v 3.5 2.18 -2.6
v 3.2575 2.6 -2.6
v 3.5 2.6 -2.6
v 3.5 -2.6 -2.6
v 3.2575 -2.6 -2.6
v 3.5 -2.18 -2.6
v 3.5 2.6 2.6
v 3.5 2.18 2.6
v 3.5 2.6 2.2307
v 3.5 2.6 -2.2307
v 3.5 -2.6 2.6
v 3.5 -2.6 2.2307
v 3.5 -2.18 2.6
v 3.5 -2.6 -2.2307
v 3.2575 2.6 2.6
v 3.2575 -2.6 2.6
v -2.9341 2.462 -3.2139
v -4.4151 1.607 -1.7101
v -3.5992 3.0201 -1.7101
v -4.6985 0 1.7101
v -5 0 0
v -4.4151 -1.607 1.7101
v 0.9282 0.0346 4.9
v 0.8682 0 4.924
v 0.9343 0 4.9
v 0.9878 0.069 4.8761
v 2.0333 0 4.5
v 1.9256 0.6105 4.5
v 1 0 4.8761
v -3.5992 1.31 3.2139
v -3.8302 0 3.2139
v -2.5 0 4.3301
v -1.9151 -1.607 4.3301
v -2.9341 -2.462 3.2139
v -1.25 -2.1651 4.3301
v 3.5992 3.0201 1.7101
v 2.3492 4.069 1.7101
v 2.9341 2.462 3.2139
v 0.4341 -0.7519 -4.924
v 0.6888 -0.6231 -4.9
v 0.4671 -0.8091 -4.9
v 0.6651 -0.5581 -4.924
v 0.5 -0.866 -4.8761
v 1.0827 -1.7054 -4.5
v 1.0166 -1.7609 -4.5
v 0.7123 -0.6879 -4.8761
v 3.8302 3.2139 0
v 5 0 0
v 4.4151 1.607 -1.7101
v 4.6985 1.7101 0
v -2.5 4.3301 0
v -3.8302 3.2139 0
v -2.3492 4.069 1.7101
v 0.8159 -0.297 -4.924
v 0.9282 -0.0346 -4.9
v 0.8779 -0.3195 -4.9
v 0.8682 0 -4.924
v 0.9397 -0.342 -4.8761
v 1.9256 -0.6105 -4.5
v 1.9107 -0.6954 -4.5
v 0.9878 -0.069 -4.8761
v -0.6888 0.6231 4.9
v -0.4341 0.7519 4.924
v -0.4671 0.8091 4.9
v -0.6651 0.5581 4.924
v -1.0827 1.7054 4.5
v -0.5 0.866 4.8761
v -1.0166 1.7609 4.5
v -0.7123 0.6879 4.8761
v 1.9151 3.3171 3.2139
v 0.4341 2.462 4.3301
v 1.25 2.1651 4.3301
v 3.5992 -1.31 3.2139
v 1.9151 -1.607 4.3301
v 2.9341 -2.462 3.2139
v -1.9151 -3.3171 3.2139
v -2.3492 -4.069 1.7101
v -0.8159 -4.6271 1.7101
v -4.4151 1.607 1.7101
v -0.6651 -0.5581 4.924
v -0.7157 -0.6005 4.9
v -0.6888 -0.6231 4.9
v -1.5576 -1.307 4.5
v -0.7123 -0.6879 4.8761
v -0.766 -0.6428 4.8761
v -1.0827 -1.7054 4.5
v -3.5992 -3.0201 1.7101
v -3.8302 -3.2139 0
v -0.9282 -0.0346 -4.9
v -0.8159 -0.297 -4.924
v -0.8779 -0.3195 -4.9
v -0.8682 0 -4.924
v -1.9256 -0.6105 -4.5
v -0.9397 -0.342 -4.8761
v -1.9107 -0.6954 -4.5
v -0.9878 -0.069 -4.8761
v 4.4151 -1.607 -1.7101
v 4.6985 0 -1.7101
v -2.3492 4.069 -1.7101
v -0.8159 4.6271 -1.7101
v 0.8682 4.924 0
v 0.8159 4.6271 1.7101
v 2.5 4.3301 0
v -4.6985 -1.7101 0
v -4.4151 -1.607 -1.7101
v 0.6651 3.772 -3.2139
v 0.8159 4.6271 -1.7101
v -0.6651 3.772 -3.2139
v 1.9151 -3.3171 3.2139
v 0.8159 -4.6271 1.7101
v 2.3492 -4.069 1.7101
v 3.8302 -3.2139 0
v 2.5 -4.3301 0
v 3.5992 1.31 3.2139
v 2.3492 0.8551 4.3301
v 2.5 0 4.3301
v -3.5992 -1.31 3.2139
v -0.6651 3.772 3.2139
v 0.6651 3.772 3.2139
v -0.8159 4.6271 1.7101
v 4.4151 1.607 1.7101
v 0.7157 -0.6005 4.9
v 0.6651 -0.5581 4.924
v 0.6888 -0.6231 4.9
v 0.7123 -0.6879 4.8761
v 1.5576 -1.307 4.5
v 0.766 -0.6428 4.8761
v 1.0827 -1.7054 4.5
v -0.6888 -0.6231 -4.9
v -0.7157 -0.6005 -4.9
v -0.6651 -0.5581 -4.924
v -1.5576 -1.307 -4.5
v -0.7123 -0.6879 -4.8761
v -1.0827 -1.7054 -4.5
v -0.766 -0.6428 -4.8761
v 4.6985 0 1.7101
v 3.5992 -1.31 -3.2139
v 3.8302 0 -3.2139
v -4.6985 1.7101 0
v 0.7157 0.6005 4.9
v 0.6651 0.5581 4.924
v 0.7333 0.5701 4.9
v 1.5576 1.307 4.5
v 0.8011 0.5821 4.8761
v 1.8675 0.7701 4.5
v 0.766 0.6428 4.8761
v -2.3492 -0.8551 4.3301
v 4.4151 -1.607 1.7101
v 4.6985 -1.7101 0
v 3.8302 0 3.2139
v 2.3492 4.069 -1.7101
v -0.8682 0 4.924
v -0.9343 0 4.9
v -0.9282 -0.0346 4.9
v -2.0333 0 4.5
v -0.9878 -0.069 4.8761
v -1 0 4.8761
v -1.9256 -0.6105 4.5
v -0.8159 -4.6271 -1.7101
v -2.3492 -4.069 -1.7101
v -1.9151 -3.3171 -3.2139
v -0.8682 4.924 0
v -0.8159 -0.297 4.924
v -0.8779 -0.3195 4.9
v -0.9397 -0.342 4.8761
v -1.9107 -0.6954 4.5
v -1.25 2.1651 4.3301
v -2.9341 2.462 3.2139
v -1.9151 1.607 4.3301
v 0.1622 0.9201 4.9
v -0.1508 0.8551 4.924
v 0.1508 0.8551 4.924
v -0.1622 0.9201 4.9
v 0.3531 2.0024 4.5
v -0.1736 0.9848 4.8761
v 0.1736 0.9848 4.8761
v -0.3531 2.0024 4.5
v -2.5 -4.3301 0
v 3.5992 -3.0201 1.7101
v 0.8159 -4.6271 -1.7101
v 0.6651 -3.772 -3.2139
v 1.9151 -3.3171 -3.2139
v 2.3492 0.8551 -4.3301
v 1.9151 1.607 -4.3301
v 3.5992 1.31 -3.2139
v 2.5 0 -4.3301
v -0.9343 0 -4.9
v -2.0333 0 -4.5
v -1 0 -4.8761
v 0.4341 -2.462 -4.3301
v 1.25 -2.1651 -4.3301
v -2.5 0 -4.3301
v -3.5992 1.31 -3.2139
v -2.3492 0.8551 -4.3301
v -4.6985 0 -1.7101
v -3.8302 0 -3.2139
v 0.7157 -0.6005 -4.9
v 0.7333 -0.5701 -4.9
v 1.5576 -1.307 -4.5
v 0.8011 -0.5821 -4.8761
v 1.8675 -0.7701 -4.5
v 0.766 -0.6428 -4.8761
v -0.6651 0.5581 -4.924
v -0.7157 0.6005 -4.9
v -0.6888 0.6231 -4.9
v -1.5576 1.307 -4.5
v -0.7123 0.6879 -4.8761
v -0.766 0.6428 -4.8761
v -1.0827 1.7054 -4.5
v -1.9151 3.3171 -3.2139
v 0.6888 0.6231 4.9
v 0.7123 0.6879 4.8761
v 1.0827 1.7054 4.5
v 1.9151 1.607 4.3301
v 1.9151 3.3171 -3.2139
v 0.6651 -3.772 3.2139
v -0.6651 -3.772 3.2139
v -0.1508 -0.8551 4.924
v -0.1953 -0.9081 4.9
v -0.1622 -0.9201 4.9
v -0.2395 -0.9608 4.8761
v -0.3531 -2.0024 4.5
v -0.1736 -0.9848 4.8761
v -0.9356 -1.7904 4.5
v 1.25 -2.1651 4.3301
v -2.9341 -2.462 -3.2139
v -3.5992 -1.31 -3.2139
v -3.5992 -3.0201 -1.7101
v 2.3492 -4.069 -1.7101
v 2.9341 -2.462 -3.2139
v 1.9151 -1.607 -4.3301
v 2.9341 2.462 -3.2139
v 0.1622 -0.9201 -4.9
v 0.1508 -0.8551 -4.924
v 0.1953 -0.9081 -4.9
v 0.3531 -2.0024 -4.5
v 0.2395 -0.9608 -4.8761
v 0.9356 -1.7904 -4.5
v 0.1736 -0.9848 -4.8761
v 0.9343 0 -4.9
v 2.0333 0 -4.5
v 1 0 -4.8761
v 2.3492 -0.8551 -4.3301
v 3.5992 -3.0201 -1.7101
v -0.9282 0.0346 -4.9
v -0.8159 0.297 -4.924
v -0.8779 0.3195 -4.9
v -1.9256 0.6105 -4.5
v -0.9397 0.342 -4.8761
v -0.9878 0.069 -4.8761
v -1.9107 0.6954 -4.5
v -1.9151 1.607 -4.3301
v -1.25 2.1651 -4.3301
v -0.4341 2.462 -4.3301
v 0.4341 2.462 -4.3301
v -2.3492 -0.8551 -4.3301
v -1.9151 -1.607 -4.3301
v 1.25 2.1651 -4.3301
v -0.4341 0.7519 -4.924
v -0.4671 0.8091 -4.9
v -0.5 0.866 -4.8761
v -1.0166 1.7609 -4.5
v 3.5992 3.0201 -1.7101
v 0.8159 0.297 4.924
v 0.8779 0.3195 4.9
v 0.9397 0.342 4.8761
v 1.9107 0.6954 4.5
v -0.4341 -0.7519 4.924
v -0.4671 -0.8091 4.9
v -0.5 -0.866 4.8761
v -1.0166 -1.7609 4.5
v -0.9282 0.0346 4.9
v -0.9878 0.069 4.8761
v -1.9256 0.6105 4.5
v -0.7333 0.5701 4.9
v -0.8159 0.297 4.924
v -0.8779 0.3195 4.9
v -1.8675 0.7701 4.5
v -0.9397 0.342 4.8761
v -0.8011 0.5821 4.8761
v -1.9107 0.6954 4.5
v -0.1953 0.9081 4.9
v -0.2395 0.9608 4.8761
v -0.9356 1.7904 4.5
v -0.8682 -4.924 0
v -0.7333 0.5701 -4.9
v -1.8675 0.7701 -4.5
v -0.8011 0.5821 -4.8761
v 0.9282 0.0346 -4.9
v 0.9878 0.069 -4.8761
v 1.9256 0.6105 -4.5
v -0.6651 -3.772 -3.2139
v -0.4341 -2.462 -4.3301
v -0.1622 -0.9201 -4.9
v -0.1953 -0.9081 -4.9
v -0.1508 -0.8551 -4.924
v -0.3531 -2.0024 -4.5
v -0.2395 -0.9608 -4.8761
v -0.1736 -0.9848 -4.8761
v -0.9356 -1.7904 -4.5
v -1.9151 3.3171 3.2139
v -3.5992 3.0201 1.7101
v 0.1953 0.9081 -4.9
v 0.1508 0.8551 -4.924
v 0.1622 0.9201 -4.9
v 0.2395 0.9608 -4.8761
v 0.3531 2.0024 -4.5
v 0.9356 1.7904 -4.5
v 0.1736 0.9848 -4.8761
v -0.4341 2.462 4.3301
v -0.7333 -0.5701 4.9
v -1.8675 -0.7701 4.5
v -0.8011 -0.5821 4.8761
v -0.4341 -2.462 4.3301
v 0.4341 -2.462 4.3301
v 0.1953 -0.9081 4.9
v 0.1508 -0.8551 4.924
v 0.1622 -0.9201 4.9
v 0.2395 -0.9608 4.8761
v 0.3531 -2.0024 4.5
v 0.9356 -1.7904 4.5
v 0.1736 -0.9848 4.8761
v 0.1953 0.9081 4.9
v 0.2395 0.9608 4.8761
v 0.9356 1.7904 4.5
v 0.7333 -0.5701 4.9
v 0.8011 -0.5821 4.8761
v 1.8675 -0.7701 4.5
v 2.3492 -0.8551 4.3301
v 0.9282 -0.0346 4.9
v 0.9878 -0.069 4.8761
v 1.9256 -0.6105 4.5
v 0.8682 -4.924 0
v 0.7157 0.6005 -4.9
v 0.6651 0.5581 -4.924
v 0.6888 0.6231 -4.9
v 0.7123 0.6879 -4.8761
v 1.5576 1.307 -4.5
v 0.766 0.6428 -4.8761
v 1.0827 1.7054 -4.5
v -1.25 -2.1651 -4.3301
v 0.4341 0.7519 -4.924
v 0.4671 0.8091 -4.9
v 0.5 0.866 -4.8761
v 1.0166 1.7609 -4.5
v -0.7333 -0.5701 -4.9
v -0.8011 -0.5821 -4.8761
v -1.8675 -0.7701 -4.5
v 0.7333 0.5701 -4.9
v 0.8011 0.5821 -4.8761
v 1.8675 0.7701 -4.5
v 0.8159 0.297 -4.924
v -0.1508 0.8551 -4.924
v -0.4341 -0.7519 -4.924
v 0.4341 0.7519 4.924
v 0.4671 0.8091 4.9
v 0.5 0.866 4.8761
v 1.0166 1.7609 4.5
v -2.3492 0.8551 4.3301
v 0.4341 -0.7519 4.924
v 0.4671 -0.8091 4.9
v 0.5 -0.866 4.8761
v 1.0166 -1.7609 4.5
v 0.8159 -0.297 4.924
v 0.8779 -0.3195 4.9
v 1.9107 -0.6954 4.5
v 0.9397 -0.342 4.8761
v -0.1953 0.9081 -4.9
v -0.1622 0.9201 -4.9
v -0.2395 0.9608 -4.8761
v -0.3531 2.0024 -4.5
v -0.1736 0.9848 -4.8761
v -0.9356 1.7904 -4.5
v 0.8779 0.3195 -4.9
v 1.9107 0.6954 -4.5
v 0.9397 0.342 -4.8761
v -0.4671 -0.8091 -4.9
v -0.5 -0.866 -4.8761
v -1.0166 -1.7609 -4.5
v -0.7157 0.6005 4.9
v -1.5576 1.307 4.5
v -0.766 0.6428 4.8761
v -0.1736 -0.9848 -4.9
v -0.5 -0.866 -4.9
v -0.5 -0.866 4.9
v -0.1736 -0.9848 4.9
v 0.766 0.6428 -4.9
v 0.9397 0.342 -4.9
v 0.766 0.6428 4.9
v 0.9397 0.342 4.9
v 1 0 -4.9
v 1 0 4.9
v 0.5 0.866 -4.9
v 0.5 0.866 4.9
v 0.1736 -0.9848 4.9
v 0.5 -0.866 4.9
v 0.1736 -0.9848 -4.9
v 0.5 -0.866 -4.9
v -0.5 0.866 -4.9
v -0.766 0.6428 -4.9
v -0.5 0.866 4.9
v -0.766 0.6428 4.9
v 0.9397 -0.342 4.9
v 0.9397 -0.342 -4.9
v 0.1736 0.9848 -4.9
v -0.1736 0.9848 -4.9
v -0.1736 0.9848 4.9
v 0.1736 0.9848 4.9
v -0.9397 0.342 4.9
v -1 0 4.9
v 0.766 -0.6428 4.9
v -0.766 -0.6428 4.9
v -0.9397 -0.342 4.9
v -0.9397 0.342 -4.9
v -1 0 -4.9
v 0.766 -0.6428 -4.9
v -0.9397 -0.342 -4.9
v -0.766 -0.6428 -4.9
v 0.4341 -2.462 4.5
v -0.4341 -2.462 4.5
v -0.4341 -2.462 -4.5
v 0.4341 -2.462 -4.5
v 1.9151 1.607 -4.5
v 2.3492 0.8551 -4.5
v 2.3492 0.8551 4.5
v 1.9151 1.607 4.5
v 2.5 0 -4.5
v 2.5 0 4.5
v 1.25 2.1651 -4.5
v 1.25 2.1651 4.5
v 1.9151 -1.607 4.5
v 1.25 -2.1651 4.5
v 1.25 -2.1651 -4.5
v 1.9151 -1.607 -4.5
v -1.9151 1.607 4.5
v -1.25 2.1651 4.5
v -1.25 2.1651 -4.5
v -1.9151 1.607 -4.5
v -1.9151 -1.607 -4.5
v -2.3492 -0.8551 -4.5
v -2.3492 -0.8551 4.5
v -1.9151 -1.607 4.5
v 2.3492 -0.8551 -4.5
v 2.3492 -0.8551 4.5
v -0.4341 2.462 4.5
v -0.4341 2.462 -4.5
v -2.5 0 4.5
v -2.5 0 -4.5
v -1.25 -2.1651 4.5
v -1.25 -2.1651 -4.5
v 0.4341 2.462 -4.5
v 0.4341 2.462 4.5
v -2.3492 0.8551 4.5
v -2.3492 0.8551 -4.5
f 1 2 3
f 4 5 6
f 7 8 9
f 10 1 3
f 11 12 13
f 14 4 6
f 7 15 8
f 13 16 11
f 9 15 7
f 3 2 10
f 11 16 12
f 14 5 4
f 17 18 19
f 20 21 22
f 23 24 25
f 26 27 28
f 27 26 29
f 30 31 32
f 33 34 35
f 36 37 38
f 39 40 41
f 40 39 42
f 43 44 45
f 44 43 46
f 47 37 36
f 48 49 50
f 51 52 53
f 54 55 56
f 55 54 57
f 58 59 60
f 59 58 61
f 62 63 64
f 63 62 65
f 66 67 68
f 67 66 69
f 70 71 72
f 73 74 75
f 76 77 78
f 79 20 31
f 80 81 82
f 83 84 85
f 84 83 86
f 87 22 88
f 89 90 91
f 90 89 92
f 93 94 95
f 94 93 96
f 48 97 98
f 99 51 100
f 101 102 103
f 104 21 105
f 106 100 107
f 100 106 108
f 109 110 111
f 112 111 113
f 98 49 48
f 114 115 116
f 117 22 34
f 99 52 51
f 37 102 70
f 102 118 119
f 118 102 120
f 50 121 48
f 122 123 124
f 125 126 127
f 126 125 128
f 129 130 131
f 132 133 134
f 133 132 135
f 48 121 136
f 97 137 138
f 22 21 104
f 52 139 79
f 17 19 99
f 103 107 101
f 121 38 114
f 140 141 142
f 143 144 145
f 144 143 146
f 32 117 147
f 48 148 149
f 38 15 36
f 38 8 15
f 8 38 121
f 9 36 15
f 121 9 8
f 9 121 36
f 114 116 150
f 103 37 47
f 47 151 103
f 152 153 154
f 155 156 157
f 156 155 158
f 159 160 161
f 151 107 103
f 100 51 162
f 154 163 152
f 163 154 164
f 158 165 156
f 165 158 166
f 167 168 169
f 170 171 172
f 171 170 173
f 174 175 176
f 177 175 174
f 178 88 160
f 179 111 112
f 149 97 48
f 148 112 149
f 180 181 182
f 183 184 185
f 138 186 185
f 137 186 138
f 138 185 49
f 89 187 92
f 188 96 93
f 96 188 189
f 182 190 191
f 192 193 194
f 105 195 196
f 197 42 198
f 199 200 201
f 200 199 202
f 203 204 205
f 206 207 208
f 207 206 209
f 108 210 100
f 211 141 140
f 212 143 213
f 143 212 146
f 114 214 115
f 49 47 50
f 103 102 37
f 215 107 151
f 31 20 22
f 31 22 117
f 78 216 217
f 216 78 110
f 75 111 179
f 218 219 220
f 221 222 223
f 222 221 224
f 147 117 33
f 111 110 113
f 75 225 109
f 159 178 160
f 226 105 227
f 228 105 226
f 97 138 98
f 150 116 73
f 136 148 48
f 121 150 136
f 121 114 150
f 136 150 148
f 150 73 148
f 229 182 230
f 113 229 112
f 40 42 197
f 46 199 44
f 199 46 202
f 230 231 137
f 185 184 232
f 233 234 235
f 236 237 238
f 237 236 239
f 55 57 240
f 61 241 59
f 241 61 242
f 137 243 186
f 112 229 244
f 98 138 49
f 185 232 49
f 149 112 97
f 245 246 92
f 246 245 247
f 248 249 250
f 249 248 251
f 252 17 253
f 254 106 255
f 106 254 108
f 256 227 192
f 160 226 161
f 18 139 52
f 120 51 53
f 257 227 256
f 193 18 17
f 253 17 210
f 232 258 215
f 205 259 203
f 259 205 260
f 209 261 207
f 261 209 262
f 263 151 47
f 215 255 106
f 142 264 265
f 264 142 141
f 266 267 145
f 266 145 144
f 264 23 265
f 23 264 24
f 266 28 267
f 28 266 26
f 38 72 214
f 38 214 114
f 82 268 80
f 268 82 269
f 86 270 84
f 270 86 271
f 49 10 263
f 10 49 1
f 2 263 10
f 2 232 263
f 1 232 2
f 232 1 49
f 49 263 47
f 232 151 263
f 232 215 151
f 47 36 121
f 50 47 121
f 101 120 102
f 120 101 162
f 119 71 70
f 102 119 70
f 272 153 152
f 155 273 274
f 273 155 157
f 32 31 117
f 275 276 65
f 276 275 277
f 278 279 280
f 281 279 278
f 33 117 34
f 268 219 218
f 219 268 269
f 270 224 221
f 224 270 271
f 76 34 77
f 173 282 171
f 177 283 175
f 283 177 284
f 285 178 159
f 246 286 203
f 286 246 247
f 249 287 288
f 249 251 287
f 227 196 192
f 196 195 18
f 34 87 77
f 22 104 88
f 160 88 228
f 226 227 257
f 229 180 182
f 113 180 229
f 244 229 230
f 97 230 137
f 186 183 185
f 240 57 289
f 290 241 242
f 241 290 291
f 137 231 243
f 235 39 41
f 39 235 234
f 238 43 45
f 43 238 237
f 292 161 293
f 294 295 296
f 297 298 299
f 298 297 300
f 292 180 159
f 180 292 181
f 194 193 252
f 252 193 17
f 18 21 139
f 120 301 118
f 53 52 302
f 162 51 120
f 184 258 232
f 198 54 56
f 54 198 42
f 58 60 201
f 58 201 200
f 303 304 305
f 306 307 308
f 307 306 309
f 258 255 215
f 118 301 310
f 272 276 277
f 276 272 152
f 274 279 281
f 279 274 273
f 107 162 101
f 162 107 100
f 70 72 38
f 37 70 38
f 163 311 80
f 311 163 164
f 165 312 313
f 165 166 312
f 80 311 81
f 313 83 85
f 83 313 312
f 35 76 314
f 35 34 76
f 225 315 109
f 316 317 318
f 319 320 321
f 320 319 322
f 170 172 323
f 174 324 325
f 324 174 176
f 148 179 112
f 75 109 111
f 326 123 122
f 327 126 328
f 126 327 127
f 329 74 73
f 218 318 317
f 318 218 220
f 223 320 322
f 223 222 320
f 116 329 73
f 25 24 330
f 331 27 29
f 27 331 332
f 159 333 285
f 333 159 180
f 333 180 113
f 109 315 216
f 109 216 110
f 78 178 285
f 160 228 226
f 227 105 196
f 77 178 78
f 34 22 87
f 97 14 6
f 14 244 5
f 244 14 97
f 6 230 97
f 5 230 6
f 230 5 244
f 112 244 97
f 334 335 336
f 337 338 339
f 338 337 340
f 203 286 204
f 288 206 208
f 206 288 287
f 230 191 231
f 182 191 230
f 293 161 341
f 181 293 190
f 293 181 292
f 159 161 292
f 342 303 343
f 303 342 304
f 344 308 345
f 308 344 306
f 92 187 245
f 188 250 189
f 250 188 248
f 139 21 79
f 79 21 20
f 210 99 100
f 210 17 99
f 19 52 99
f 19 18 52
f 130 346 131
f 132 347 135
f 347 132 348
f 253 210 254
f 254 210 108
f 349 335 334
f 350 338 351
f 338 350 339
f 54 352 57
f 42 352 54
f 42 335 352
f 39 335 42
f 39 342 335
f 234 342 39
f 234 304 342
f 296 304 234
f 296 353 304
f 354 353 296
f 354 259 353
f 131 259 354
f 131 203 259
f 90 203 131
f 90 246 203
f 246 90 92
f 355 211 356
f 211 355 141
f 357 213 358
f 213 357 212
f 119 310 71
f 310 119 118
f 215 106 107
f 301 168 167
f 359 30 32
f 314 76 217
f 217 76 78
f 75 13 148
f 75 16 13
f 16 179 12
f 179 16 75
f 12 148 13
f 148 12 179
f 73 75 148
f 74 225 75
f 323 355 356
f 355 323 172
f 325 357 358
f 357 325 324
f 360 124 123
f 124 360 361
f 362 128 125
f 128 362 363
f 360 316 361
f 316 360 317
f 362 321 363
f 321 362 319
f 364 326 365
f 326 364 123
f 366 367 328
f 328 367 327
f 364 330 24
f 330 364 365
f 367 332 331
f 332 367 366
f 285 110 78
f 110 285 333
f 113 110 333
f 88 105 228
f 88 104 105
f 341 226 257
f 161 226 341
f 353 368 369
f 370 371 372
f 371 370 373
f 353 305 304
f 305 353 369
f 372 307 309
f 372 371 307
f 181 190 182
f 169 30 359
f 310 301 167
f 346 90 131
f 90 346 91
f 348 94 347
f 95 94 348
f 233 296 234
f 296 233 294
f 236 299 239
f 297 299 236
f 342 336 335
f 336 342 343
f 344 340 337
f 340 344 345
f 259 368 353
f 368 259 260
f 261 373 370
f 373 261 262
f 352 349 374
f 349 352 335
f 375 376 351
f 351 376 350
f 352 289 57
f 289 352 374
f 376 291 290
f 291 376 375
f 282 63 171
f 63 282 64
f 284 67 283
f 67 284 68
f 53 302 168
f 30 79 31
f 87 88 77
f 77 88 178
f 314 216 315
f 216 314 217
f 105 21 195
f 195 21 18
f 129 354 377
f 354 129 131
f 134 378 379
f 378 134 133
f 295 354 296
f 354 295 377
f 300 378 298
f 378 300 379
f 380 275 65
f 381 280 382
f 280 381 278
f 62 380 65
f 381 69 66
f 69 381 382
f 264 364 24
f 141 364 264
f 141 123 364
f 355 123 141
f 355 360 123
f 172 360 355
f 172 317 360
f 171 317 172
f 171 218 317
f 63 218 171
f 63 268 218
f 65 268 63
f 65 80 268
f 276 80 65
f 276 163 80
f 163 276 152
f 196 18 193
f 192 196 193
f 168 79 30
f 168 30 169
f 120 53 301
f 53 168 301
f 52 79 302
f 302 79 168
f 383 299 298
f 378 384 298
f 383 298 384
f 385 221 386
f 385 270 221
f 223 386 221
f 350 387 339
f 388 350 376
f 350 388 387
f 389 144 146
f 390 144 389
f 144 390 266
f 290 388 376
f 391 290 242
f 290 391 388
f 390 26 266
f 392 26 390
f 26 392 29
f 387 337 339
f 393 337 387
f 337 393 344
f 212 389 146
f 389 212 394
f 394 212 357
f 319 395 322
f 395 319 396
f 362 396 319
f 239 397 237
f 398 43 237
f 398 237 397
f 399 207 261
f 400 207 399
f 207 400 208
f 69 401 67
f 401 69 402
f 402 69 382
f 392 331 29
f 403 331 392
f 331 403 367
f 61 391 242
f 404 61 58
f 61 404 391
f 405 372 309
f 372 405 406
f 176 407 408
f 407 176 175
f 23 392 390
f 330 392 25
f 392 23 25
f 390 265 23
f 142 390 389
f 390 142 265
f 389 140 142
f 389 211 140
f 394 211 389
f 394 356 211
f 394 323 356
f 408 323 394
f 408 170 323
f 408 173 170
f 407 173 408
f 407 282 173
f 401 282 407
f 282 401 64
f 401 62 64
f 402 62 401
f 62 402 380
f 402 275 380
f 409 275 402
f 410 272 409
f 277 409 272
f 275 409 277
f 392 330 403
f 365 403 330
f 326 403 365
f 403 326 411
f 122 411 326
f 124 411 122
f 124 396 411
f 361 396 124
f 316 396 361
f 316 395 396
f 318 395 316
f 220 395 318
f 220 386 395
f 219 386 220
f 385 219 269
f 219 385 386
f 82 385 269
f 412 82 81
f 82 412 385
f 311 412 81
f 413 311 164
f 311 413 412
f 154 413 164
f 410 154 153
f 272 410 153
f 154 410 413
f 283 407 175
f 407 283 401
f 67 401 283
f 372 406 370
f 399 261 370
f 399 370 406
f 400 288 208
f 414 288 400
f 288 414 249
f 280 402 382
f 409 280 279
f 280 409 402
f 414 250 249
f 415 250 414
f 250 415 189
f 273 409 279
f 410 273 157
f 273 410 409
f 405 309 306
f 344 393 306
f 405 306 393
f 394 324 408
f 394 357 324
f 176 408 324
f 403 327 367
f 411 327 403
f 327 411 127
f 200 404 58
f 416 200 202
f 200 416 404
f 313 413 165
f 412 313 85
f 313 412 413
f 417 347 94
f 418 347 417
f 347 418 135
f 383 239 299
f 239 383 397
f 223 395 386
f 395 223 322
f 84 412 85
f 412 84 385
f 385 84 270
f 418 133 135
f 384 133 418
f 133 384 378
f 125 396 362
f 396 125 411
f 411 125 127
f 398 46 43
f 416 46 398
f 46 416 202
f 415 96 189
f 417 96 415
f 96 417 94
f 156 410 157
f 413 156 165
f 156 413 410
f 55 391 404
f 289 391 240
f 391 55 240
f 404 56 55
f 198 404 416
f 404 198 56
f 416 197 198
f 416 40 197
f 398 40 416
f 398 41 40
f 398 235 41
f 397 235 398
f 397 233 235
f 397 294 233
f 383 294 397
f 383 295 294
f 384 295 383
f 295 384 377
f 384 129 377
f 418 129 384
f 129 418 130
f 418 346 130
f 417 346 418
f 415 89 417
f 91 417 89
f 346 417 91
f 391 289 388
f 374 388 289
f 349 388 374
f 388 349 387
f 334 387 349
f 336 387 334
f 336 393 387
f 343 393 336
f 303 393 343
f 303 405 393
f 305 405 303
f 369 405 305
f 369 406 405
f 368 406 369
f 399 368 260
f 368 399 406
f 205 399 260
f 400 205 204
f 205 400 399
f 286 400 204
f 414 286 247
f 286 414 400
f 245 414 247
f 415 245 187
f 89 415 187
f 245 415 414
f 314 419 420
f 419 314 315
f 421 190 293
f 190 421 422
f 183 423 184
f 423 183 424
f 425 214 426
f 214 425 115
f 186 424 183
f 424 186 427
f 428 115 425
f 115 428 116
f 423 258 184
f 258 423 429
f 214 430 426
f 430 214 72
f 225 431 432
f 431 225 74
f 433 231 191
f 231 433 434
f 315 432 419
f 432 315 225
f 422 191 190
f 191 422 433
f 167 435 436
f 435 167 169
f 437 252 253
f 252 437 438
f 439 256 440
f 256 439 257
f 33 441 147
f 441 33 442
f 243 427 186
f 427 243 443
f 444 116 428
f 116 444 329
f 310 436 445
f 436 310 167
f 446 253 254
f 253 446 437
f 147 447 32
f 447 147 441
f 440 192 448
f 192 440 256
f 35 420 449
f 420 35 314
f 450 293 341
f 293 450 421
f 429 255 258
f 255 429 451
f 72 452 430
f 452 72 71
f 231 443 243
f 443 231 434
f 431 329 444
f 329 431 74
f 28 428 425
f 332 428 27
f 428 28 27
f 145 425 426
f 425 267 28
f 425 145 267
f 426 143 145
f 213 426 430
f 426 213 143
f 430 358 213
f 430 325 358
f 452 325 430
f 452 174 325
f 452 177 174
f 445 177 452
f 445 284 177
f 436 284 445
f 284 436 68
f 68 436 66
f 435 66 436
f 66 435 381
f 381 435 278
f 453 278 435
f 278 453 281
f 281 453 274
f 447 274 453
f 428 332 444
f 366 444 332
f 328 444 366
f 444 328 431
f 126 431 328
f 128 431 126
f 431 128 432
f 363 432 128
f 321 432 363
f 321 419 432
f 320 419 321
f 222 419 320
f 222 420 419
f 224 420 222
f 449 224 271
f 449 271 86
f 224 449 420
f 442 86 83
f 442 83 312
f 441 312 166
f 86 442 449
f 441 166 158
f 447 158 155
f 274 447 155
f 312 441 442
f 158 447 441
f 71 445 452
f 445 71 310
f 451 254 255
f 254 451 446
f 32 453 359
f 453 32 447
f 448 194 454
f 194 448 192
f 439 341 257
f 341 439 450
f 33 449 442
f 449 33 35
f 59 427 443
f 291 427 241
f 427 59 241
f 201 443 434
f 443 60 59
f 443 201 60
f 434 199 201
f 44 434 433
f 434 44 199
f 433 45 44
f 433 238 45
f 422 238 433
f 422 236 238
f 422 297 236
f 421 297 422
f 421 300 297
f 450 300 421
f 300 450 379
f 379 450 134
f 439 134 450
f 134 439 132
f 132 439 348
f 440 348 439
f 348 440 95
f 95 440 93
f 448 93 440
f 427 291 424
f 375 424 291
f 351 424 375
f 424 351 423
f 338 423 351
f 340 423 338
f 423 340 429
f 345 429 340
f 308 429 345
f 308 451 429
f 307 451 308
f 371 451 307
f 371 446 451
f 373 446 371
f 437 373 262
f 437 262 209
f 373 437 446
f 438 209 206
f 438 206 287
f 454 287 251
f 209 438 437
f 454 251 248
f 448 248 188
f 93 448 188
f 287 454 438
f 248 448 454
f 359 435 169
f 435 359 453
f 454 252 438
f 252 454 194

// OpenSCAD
smooth = 18;

//union() {

//for (i = [-2:2]) {
//    translate([20*i,0,0]) {
//        union() {
            color("Blue", 0.1) {
//                difference() {
                    sphere(d=10, $fn=smooth);
//                    cylinder(2.5, d=10, center=true, $fn=smooth);
//                }
            }
            color("gray", 1) {
                cylinder(9.8, d=2, center=true, $fn=smooth);
            }
            color("orange", 1) {
                cylinder(9, d=5, center=true, $fn=smooth);
            }
//            color("ForestGreen") {
//                cylinder(0.5, d=10, center=true, $fn=smooth);
//            }
//            color("Black") {
//                rotate(a=[0,90,0]) {
//                    cylinder(20, d=0.5, center=true, $fn=smooth/10);
//                }
//            }
//            color("Red") {
//                translate([0,-0.5,0]) {
//                    rotate(a=[0,90,0]) {
//                        cylinder(20, d=0.5, center=true, $fn=smooth/10);
//                    }
//                }
//            }
//            color("White") {
//                translate([0,0.5,0]) {
//                    rotate(a=[0,90,0]) {
//                        cylinder(20, d=0.5, center=true, $fn=smooth/10);
//                    }
//                }
//            }
            color("Black") {
                translate([-3,0,0]) {
                    rotate(a=[0,90,0]) {
                        cube([3.9,5,1], center=true);
                    }
                }
                translate([3,0,0]) {
                    rotate(a=[0,90,0]) {
                        cube([5.2,5.2,1], center=true);
                    }
                }
            }            
//        }
//    }
//}

//}
